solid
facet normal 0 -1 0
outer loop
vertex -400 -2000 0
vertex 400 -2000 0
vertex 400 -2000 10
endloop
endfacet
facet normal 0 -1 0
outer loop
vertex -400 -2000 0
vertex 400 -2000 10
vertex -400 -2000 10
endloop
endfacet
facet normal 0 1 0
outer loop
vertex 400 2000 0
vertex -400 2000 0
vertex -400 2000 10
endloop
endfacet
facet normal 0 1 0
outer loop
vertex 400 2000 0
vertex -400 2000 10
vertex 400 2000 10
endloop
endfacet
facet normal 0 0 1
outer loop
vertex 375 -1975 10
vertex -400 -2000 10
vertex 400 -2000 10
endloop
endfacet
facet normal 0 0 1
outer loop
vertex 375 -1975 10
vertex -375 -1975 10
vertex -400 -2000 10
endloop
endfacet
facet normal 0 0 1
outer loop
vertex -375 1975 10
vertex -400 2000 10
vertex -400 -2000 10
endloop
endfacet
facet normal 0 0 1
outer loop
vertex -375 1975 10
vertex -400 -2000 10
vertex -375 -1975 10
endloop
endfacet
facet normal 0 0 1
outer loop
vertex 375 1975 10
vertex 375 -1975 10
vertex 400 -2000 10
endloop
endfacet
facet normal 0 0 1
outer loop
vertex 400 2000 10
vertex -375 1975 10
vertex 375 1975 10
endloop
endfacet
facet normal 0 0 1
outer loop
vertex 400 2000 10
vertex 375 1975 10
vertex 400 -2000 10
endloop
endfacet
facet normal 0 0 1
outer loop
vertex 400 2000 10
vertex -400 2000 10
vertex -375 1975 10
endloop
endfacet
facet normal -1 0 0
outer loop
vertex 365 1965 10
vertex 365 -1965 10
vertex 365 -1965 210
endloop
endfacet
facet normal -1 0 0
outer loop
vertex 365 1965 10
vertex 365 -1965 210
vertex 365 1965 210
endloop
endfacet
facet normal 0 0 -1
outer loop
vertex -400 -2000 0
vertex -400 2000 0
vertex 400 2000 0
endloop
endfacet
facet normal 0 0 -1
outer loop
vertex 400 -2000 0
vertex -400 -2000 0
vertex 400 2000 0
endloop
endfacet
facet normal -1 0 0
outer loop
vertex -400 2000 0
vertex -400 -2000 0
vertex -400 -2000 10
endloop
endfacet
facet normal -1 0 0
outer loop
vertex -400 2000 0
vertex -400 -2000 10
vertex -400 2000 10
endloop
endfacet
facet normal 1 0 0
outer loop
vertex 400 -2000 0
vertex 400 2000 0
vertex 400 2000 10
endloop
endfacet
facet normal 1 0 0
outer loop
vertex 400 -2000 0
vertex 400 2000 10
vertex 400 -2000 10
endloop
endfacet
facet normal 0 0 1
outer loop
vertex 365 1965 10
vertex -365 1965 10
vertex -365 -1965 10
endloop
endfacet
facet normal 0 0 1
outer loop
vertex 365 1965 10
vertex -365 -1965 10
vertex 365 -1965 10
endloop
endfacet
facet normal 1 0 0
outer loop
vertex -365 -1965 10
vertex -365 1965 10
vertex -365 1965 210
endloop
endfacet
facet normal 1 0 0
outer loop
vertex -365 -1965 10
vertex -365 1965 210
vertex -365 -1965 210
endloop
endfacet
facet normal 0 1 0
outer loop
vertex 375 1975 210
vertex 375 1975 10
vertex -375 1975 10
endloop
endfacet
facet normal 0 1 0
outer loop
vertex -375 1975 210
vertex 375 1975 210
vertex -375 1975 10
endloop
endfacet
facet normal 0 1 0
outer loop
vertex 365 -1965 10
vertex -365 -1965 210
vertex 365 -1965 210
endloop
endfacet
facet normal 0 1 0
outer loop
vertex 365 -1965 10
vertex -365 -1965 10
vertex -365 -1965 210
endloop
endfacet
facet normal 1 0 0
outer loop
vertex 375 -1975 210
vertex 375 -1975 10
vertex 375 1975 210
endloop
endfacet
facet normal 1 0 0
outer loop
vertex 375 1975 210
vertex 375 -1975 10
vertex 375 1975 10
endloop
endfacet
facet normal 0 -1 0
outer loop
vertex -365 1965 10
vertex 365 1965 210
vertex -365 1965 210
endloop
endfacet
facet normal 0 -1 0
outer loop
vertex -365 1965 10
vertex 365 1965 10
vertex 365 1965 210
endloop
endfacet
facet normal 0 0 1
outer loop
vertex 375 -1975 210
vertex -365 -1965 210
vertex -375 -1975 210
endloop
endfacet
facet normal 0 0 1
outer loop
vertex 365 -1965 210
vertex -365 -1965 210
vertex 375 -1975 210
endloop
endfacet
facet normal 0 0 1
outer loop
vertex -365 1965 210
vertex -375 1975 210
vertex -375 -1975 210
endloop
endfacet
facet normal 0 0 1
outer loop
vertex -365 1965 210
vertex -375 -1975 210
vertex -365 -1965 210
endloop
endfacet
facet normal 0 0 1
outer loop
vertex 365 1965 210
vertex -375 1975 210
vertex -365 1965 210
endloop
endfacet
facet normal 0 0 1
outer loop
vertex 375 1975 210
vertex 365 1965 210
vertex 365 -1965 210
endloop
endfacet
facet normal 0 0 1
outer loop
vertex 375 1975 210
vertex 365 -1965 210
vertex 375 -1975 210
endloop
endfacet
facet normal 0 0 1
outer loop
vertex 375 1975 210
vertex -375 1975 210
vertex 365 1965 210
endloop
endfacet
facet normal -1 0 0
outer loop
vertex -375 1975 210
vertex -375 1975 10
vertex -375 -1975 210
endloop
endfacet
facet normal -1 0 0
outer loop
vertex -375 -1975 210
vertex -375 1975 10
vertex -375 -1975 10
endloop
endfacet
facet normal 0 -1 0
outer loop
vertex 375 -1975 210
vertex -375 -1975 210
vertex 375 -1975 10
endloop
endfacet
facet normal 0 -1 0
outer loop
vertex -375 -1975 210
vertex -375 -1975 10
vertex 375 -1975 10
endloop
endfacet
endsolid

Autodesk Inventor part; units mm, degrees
ref_plane "YZ Plane" through (0, 0, 0) normal (1, 0, 0) x (0, 1, 0)
ref_plane "XZ Plane" through (0, 0, 0) normal (0, 1, 0) x (-1, 0, 0)
ref_plane "XY Plane" through (0, 0, 0) normal (0, 0, 1) x (1, 0, 0)
sketch "Sketch1" plane through (0, 0, 0) normal (0, 0, 1) x (1, 0, 0)
  line L0 (-400, 2000) -> (400, 2000)
  line L1 (400, 2000) -> (400, -2000)
  line L2 (400, -2000) -> (-400, -2000)
  line L3 (-400, -2000) -> (-400, 2000)
  line L4 (-400, 2000) -> (400, -2000) construction
  line L5 (400, 2000) -> (-400, -2000) construction
  point P0 (0, 0)
  dimension "d0" = 800
  dimension "d1" = 4000
extrude "Extrusion1" add sketch "Sketch1" along normal blind 10
sketch "Sketch2" plane through (0, 0, 10) normal (0, 0, 1) x (1, 0, 0)
  line L0 (-400, -2000) -> (400, -2000) projected
  line L1 (400, -2000) -> (400, 2000) projected
  line L2 (400, 2000) -> (-400, 2000) projected
  line L3 (-400, 2000) -> (-400, -2000) projected
  line L4 (-375, -1975) -> (375, -1975)
  line L5 (375, -1975) -> (375, 1975)
  line L6 (375, 1975) -> (-375, 1975)
  line L7 (-375, 1975) -> (-375, -1975)
  line L8 (-365, -1965) -> (365, -1965)
  line L9 (365, -1965) -> (365, 1965)
  line L10 (365, 1965) -> (-365, 1965)
  line L11 (-365, 1965) -> (-365, -1965)
  point P0 (0, 0)
  dimension "d4" = 25
  dimension "d5" = 10
extrude "Extrusion2" add sketch "Sketch2" along normal blind 200 contours L7 L6 L5 L4
properties part number "GNG НаOCl pan"
